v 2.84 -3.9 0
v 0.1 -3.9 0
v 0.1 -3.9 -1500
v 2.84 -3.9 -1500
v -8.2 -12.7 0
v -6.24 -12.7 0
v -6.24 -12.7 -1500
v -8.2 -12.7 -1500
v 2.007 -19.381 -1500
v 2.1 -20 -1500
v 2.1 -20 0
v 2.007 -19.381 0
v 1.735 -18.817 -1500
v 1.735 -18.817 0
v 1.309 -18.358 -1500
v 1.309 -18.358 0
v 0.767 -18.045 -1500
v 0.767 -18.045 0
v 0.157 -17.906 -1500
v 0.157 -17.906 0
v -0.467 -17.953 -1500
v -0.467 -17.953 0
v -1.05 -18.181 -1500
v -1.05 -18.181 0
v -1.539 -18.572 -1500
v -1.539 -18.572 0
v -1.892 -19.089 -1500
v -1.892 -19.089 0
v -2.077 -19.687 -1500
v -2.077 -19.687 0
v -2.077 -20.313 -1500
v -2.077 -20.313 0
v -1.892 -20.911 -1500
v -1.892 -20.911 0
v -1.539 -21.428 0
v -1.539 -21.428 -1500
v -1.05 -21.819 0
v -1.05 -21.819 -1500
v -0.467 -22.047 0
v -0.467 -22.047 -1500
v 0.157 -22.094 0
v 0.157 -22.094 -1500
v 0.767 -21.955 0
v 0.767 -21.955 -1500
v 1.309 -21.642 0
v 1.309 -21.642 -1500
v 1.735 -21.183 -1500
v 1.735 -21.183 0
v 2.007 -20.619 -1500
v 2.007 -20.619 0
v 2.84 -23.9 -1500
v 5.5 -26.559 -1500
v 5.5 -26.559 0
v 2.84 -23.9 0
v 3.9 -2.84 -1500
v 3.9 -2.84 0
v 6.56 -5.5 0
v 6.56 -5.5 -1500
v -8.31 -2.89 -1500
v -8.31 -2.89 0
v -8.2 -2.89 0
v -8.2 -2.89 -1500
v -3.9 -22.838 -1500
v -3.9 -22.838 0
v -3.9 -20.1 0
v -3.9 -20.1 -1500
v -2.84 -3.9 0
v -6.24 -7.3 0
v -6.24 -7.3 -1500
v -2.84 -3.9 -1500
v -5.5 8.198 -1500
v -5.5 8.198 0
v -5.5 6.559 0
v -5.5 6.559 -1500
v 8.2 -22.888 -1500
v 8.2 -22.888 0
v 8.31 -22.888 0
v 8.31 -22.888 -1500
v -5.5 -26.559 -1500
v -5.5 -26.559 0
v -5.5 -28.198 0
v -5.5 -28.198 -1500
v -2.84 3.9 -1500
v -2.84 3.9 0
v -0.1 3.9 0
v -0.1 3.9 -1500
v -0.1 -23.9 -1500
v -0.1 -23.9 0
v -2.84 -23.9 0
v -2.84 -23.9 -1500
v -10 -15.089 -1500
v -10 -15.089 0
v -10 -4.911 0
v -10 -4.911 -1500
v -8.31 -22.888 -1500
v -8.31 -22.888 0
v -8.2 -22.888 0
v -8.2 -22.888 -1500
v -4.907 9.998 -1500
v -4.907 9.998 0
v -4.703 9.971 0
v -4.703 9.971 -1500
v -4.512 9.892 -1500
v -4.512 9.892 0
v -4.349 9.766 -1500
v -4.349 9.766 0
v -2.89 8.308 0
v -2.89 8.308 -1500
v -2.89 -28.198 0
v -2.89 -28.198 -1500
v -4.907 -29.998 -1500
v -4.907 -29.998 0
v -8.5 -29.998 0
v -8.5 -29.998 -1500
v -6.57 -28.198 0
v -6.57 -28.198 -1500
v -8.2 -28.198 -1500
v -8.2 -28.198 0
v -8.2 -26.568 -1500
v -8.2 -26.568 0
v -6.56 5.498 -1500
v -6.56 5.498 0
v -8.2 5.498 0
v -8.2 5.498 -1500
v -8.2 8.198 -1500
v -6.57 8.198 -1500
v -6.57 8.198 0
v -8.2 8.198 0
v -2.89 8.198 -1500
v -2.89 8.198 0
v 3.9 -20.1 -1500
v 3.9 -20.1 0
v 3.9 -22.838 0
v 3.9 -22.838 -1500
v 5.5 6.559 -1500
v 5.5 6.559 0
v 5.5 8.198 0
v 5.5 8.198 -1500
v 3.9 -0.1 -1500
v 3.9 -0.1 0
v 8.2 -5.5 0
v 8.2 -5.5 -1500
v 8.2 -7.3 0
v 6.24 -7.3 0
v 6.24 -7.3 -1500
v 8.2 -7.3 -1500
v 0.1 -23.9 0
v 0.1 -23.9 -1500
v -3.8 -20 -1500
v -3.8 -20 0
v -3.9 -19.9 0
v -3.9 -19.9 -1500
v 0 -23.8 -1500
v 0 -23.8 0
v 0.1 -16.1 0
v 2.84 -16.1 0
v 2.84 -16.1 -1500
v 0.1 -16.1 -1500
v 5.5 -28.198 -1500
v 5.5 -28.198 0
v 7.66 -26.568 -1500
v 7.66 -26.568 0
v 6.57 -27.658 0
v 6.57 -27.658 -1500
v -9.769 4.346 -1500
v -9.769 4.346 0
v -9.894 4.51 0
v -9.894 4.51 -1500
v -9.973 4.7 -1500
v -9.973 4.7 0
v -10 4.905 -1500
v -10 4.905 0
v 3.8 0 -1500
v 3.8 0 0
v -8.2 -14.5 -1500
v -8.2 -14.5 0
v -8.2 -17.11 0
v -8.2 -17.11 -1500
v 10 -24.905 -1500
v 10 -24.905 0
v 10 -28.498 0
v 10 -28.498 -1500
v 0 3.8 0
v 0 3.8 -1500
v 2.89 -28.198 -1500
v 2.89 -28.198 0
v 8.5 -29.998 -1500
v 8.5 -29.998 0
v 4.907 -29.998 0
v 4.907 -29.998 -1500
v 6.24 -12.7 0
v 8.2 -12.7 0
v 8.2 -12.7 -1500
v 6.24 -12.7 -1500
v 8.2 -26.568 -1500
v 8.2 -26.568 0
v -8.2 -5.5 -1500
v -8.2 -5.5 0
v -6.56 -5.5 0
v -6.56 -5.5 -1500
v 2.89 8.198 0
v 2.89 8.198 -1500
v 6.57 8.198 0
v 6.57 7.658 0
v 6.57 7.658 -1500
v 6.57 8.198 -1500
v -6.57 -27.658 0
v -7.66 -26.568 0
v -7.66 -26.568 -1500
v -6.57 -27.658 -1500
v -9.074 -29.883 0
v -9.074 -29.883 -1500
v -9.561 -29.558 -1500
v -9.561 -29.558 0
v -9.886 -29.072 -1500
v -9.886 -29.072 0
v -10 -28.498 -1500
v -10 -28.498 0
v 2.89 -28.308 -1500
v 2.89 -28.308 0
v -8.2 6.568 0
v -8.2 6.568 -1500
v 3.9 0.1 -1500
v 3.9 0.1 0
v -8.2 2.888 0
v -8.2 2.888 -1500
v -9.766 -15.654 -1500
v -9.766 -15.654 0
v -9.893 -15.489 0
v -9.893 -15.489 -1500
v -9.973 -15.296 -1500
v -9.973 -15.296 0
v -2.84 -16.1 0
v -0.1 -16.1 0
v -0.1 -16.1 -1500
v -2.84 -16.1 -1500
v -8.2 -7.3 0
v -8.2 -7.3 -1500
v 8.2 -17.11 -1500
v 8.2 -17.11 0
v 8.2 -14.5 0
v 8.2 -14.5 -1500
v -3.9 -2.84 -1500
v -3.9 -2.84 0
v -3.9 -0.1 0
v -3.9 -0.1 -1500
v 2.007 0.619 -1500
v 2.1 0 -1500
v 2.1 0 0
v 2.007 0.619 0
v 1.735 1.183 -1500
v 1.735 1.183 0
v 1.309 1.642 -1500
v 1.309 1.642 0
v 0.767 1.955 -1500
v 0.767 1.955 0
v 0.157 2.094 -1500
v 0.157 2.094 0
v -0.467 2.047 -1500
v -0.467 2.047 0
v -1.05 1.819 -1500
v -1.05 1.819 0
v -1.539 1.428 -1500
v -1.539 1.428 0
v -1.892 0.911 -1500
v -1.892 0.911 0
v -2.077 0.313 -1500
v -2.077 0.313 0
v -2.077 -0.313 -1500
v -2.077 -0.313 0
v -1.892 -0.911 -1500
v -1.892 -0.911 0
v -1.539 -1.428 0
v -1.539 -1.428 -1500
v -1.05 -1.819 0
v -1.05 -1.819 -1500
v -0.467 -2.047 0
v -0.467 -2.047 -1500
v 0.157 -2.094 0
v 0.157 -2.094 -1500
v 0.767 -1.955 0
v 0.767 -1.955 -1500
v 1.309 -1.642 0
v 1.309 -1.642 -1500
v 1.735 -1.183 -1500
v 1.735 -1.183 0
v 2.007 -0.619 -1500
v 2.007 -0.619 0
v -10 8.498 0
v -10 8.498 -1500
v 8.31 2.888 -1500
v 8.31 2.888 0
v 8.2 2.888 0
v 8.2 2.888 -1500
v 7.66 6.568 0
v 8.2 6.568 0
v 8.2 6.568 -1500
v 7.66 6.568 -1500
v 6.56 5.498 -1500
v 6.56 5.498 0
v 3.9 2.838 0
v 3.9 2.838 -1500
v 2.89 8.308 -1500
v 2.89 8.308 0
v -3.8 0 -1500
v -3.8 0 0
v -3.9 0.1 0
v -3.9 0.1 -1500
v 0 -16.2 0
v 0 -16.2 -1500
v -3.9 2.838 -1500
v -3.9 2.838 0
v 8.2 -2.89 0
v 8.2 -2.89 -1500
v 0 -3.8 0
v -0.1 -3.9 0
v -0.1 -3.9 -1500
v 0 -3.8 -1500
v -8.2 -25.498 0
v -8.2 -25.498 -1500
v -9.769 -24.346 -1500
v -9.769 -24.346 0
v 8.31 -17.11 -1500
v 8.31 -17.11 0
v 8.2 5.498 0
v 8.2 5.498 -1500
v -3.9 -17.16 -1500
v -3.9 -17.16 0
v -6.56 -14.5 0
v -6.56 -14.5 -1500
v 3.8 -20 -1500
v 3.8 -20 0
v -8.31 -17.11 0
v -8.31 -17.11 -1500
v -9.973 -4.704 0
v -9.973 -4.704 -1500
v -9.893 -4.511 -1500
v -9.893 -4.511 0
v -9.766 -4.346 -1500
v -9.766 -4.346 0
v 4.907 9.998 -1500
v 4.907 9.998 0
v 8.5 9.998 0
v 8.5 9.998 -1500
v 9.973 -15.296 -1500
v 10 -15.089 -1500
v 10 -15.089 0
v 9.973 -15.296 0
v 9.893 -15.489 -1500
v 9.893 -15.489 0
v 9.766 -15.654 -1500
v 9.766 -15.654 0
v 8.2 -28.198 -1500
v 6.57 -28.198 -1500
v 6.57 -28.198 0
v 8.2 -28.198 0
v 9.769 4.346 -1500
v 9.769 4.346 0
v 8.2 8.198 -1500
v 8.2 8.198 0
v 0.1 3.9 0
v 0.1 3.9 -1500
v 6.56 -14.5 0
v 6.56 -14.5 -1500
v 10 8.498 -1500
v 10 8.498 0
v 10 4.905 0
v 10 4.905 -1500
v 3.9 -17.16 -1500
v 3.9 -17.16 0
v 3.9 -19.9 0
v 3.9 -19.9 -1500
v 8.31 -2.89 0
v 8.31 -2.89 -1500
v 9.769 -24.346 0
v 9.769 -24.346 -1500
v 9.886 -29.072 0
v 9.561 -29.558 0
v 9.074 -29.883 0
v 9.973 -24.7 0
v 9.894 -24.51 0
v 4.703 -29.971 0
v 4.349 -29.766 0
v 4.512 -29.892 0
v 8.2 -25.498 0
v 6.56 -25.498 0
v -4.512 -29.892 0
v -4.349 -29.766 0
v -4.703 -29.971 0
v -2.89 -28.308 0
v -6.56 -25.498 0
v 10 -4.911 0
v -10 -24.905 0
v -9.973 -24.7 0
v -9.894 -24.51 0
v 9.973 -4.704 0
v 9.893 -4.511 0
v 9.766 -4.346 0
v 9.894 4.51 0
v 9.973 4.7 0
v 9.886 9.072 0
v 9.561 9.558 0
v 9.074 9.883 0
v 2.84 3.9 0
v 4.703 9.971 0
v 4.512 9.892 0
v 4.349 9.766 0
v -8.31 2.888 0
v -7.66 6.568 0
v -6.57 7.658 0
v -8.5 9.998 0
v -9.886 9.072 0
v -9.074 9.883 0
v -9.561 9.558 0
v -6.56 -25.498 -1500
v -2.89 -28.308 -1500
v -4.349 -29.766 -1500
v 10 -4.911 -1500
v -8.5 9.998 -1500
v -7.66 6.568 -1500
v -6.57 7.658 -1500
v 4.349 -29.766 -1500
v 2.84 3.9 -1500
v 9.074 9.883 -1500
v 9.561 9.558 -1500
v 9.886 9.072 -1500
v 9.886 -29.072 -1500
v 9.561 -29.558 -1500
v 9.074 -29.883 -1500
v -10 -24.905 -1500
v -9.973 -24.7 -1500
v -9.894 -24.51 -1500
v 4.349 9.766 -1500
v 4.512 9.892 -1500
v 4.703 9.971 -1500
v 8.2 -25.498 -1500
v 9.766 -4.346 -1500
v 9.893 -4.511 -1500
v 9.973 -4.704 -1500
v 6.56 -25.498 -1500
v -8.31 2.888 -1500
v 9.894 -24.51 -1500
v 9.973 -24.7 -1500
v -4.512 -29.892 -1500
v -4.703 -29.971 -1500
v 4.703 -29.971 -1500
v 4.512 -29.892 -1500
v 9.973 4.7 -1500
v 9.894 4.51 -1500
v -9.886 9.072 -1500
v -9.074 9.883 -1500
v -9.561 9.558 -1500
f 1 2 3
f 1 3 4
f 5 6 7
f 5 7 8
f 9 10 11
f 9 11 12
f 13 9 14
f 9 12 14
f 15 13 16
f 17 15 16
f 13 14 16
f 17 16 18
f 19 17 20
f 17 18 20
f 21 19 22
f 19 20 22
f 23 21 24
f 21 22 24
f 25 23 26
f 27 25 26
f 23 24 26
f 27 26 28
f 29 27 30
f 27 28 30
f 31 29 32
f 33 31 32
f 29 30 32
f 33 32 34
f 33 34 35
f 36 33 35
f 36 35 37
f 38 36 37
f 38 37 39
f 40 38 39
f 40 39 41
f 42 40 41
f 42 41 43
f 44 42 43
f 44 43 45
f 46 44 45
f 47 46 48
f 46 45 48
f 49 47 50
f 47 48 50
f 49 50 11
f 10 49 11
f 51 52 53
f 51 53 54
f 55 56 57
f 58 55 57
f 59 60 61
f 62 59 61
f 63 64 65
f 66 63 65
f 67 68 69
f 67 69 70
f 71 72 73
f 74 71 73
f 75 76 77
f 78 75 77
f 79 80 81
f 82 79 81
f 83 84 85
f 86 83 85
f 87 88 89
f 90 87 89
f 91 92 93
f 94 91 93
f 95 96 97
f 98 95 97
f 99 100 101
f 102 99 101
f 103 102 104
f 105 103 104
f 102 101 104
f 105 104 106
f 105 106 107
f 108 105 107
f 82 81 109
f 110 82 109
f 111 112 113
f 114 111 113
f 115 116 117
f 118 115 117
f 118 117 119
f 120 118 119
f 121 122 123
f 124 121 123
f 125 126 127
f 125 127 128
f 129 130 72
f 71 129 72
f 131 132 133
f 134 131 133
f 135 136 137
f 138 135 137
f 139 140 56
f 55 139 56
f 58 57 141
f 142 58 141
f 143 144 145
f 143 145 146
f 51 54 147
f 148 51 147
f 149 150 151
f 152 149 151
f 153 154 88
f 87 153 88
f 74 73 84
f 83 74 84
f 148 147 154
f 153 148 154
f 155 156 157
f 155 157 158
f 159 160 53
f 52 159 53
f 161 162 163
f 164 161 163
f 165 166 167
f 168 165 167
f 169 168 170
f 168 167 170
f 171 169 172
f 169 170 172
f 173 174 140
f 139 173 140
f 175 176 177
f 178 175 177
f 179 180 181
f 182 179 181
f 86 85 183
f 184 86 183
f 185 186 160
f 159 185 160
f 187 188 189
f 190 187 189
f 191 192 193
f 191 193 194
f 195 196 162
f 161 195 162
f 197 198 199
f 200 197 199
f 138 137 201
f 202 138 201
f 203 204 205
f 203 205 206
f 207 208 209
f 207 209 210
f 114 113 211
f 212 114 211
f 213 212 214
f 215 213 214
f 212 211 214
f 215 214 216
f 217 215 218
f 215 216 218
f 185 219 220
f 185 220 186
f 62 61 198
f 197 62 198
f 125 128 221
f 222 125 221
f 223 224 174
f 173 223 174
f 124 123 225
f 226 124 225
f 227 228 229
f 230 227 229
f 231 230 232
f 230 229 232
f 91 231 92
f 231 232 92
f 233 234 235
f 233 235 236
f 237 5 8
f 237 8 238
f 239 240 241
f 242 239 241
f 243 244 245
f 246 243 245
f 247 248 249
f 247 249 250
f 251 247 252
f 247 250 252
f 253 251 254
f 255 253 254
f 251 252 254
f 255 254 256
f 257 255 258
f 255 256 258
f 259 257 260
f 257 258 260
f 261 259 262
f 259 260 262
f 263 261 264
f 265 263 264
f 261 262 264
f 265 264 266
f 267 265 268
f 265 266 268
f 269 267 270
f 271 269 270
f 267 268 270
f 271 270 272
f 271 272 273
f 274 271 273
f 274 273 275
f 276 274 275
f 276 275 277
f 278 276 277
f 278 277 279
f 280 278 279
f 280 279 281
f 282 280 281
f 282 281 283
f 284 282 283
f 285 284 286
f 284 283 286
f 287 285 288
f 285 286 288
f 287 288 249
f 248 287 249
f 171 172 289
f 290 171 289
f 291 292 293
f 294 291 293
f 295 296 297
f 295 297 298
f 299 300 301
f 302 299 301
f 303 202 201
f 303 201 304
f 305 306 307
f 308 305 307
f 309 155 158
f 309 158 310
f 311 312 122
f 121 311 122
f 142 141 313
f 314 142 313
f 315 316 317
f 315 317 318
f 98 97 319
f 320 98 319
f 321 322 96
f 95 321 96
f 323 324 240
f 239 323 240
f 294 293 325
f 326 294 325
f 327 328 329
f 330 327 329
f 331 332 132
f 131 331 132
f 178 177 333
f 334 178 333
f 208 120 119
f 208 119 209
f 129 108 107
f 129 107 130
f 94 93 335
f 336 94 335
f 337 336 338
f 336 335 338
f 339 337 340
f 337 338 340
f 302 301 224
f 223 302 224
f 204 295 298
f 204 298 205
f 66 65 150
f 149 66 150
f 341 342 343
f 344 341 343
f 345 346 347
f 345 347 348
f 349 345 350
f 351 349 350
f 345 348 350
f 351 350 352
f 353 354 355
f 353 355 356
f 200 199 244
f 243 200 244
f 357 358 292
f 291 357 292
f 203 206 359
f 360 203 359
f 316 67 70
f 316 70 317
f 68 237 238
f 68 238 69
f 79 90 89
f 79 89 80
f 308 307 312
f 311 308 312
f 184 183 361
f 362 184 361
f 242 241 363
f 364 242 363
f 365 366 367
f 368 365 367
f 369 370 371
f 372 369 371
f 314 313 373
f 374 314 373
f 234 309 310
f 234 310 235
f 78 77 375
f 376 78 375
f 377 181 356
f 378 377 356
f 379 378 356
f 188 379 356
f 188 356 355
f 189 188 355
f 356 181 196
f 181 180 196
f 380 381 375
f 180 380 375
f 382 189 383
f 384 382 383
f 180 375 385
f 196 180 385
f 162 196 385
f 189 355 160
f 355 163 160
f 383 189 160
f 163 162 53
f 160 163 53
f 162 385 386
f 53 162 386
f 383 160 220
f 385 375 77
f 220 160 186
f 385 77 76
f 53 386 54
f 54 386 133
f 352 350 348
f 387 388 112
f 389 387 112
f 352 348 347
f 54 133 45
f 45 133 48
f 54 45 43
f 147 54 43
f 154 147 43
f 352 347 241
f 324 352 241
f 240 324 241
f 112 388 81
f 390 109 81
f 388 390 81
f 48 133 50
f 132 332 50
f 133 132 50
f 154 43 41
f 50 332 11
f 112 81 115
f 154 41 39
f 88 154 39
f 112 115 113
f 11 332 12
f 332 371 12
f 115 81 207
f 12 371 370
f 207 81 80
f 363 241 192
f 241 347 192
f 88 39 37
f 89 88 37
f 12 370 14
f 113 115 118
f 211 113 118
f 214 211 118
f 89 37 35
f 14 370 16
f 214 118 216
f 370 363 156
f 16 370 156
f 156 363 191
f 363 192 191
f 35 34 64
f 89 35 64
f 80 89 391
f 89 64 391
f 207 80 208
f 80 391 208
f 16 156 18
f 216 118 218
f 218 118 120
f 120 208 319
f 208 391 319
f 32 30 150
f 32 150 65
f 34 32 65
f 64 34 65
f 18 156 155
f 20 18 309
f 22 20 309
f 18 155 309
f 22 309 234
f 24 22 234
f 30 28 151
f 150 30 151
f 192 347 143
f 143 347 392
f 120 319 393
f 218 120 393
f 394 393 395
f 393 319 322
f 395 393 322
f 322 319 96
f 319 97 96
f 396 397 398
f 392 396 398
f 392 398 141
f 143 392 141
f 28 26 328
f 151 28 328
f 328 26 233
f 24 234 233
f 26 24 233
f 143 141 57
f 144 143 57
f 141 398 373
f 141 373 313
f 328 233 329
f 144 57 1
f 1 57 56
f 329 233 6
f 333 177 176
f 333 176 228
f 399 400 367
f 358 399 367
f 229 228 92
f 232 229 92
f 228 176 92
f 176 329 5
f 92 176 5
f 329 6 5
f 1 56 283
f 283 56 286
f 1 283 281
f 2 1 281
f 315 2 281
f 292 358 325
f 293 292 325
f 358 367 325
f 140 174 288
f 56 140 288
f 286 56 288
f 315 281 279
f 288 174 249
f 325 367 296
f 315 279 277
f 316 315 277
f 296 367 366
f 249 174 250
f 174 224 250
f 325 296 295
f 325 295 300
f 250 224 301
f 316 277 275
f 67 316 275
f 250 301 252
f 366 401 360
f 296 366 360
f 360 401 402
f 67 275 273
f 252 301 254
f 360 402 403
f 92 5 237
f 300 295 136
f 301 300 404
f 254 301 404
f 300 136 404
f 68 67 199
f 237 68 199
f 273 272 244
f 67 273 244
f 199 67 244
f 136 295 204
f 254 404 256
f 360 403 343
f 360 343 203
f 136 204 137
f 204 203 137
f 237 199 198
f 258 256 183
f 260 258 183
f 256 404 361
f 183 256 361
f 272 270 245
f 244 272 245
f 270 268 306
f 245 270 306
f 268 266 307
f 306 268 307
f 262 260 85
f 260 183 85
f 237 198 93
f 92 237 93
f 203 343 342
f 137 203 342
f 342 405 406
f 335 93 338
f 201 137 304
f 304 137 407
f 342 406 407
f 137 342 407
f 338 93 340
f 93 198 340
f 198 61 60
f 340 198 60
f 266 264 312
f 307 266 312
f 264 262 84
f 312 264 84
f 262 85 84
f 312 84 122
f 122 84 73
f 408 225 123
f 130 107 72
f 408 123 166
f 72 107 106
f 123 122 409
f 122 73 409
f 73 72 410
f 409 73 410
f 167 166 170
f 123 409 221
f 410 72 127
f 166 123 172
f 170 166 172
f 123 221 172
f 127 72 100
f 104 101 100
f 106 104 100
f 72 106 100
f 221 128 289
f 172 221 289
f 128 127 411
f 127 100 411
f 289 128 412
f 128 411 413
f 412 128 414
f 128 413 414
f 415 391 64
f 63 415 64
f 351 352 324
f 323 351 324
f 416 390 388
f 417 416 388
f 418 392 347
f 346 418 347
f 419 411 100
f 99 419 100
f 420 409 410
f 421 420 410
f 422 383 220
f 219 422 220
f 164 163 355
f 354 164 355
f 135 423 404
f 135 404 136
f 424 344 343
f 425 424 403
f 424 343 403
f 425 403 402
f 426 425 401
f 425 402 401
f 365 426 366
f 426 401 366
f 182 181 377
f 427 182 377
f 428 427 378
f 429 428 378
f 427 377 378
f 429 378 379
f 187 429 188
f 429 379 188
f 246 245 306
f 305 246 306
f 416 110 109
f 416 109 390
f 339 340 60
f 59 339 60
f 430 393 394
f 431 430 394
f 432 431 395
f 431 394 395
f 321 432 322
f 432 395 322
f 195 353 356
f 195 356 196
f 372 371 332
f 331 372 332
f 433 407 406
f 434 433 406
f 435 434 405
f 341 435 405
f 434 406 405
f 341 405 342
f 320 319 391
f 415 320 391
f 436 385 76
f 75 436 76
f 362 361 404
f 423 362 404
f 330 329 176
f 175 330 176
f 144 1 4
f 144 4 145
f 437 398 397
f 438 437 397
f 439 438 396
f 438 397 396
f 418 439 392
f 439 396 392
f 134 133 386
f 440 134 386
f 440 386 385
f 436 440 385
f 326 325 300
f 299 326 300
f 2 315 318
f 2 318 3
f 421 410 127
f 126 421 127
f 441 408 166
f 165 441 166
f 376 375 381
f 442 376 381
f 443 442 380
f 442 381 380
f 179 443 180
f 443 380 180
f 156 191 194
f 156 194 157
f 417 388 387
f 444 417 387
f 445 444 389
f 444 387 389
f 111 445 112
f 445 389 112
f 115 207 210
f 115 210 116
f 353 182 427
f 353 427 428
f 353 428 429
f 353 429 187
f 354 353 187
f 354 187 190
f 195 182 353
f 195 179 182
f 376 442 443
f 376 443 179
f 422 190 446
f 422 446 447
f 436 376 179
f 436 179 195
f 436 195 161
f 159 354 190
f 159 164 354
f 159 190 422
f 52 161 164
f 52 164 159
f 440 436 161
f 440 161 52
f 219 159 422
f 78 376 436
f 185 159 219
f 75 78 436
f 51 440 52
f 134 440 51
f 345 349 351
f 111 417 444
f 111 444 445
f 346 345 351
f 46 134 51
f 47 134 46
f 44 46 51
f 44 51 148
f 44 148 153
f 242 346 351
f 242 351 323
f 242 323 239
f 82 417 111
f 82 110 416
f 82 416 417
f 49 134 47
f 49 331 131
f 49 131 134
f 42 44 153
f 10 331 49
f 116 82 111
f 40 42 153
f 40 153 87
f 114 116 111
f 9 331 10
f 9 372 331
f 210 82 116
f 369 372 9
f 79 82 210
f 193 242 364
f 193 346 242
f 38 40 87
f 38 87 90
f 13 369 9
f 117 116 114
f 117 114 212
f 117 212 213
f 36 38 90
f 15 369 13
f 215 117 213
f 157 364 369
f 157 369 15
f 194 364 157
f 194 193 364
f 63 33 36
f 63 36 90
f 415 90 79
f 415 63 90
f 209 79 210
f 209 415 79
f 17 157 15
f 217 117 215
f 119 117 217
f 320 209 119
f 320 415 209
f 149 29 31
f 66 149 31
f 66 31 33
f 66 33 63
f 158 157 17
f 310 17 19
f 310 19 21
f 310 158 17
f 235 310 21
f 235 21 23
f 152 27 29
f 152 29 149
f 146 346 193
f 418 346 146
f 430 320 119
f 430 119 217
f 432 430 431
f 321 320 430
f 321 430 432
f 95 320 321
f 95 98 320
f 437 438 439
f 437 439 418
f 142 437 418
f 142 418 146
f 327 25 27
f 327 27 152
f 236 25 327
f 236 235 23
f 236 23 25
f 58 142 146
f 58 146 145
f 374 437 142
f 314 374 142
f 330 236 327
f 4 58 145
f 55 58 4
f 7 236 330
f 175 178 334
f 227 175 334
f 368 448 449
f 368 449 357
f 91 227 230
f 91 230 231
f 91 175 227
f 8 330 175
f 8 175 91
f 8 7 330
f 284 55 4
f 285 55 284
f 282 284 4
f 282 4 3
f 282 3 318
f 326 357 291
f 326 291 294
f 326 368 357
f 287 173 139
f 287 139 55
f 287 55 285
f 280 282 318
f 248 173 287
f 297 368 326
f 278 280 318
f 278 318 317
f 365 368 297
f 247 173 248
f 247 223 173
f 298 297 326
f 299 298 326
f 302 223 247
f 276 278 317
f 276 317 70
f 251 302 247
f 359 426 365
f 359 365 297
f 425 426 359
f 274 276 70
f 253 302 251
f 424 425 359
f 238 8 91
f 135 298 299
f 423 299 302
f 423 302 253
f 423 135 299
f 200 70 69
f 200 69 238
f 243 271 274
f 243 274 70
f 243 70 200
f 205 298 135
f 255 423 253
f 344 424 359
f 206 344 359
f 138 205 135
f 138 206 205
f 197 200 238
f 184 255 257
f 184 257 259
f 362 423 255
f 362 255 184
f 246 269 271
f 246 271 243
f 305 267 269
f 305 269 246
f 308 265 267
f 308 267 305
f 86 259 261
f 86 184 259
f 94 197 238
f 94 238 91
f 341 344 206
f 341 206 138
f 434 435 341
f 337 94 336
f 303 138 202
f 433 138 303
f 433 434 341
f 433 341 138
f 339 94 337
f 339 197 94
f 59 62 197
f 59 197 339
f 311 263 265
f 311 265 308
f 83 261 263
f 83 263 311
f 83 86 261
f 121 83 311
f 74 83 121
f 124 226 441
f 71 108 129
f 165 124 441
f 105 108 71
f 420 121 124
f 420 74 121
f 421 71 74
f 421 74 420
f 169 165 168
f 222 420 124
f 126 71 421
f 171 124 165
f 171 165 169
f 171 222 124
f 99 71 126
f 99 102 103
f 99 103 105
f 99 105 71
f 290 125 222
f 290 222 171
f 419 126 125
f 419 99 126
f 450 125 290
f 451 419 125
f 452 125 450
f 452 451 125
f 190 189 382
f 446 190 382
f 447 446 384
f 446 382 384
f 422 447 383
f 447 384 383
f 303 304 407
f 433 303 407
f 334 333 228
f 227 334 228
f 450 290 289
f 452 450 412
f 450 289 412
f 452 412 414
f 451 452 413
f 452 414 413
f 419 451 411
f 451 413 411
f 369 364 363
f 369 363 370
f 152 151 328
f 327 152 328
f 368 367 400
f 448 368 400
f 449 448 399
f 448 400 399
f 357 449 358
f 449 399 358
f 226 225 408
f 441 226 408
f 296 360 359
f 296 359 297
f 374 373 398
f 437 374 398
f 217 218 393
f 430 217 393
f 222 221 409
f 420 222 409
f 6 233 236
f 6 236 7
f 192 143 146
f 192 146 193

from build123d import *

# Parameters (mm, degrees)
SKETCH2_R           = 2.1
BOSS_EXTRUDE1_DEPTH = 1500


with BuildPart() as part:
    # Sketch2 → Boss-Extrude1 (new body)
    with BuildSketch(Plane.XY):
        with BuildLine():
            Line((-0.1, 3.9), (0, 3.8))
            Line((0, 3.8), (0.1, 3.9))
            Line((0.1, 3.9), (2.840365134, 3.9))
            Line((2.840365134, 3.9), (5.5, 6.558825842))
            Line((5.5, 6.558825842), (5.5, 8.197505675))
            Line((5.5, 8.197505675), (2.89, 8.197505675))
            Line((2.89, 8.197505675), (2.89, 8.307505675))
            Line((2.89, 8.307505675), (4.348614357, 9.766120032))
            ThreePointArc((4.348614357, 9.766120032), (4.604908803, 9.937370505), (4.907228714, 9.997505675))
            Line((4.907228714, 9.997505675), (8.5, 9.997505675))
            ThreePointArc((8.5, 9.997505675), (9.560660172, 9.558165846), (10, 8.497505675))
            Line((10, 8.497505675), (10, 4.904734389))
            ThreePointArc((10, 4.904734389), (9.939864831, 4.602414477), (9.768614357, 4.346120032))
            Line((9.768614357, 4.346120032), (8.31, 2.887505675))
            Line((8.31, 2.887505675), (8.2, 2.887505675))
            Line((8.2, 2.887505675), (8.2, 5.497505675))
            Line((8.2, 5.497505675), (6.56, 5.497505675))
            Line((6.56, 5.497505675), (3.9, 2.83831481))
            Line((3.9, 2.83831481), (3.9, 0.1))
            Line((3.9, 0.1), (3.8, 0))
            Line((3.8, 0), (3.9, -0.1))
            Line((3.9, -0.1), (3.9, -2.84))
            Line((3.9, -2.84), (6.56, -5.5))
            Line((6.56, -5.5), (8.2, -5.5))
            Line((8.2, -5.5), (8.2, -2.89))
            Line((8.2, -2.89), (8.31, -2.89))
            Line((8.31, -2.89), (9.765685425, -4.345685425))
            ThreePointArc((9.765685425, -4.345685425), (9.939103626, -4.605224104), (10, -4.91137085))
            Line((10, -4.91137085), (10, -15.08862915))
            ThreePointArc((10, -15.08862915), (9.939103626, -15.394775896), (9.765685425, -15.654314575))
            Line((9.765685425, -15.654314575), (8.31, -17.11))
            Line((8.31, -17.11), (8.2, -17.11))
            Line((8.2, -17.11), (8.2, -14.5))
            Line((8.2, -14.5), (6.56, -14.5))
            Line((6.56, -14.5), (3.9, -17.16))
            Line((3.9, -17.16), (3.9, -19.9))
            Line((3.9, -19.9), (3.8, -20))
            Line((3.8, -20), (3.9, -20.1))
            Line((3.9, -20.1), (3.9, -22.83831481))
            Line((3.9, -22.83831481), (6.56, -25.497505675))
            Line((6.56, -25.497505675), (8.2, -25.497505675))
            Line((8.2, -25.497505675), (8.2, -22.887505675))
            Line((8.2, -22.887505675), (8.31, -22.887505675))
            Line((8.31, -22.887505675), (9.768614357, -24.346120032))
            ThreePointArc((9.768614357, -24.346120032), (9.939864831, -24.602414477), (10, -24.904734389))
            Line((10, -24.904734389), (10, -28.497505675))
            ThreePointArc((10, -28.497505675), (9.560660172, -29.558165846), (8.5, -29.997505675))
            Line((8.5, -29.997505675), (4.907228714, -29.997505675))
            ThreePointArc((4.907228714, -29.997505675), (4.604908803, -29.937370505), (4.348614357, -29.766120032))
            Line((4.348614357, -29.766120032), (2.89, -28.307505675))
            Line((2.89, -28.307505675), (2.89, -28.197505675))
            Line((2.89, -28.197505675), (5.5, -28.197505675))
            Line((5.5, -28.197505675), (5.5, -26.558825842))
            Line((5.5, -26.558825842), (2.840365134, -23.9))
            Line((2.840365134, -23.9), (0.1, -23.9))
            Line((0.1, -23.9), (0, -23.8))
            Line((0, -23.8), (-0.1, -23.9))
            Line((-0.1, -23.9), (-2.840365134, -23.9))
            Line((-2.840365134, -23.9), (-5.5, -26.558825842))
            Line((-5.5, -26.558825842), (-5.5, -28.197505675))
            Line((-5.5, -28.197505675), (-2.89, -28.197505675))
            Line((-2.89, -28.197505675), (-2.89, -28.307505675))
            Line((-2.89, -28.307505675), (-4.348614357, -29.766120032))
            ThreePointArc((-4.348614357, -29.766120032), (-4.604908803, -29.937370505), (-4.907228714, -29.997505675))
            Line((-4.907228714, -29.997505675), (-8.5, -29.997505675))
            ThreePointArc((-8.5, -29.997505675), (-9.560660172, -29.558165846), (-10, -28.497505675))
            Line((-10, -28.497505675), (-10, -24.904734389))
            ThreePointArc((-10, -24.904734389), (-9.939864831, -24.602414477), (-9.768614357, -24.346120032))
            Line((-9.768614357, -24.346120032), (-8.31, -22.887505675))
            Line((-8.31, -22.887505675), (-8.2, -22.887505675))
            Line((-8.2, -22.887505675), (-8.2, -25.497505675))
            Line((-8.2, -25.497505675), (-6.56, -25.497505675))
            Line((-6.56, -25.497505675), (-3.9, -22.83831481))
            Line((-3.9, -22.83831481), (-3.9, -20.1))
            Line((-3.9, -20.1), (-3.8, -20))
            Line((-3.8, -20), (-3.9, -19.9))
            Line((-3.9, -19.9), (-3.9, -17.16))
            Line((-3.9, -17.16), (-6.56, -14.5))
            Line((-6.56, -14.5), (-8.2, -14.5))
            Line((-8.2, -14.5), (-8.2, -17.11))
            Line((-8.2, -17.11), (-8.31, -17.11))
            Line((-8.31, -17.11), (-9.765685425, -15.654314575))
            ThreePointArc((-9.765685425, -15.654314575), (-9.939103626, -15.394775896), (-10, -15.08862915))
            Line((-10, -15.08862915), (-10, -4.91137085))
            ThreePointArc((-10, -4.91137085), (-9.939103626, -4.605224104), (-9.765685425, -4.345685425))
            Line((-9.765685425, -4.345685425), (-8.31, -2.89))
            Line((-8.31, -2.89), (-8.2, -2.89))
            Line((-8.2, -2.89), (-8.2, -5.5))
            Line((-8.2, -5.5), (-6.56, -5.5))
            Line((-6.56, -5.5), (-3.9, -2.84))
            Line((-3.9, -2.84), (-3.9, -0.1))
            Line((-3.9, -0.1), (-3.8, 0))
            Line((-3.8, 0), (-3.9, 0.1))
            Line((-3.9, 0.1), (-3.9, 2.83831481))
            Line((-3.9, 2.83831481), (-6.56, 5.497505675))
            Line((-6.56, 5.497505675), (-8.2, 5.497505675))
            Line((-8.2, 5.497505675), (-8.2, 2.887505675))
            Line((-8.2, 2.887505675), (-8.31, 2.887505675))
            Line((-8.31, 2.887505675), (-9.768614357, 4.346120032))
            ThreePointArc((-9.768614357, 4.346120032), (-9.939864831, 4.602414477), (-10, 4.904734389))
            Line((-10, 4.904734389), (-10, 8.497505675))
            ThreePointArc((-10, 8.497505675), (-9.560660172, 9.558165846), (-8.5, 9.997505675))
            Line((-8.5, 9.997505675), (-4.907228714, 9.997505675))
            ThreePointArc((-4.907228714, 9.997505675), (-4.604908803, 9.937370505), (-4.348614357, 9.766120032))
            Line((-4.348614357, 9.766120032), (-2.89, 8.307505675))
            Line((-2.89, 8.307505675), (-2.89, 8.197505675))
            Line((-2.89, 8.197505675), (-5.5, 8.197505675))
            Line((-5.5, 8.197505675), (-5.5, 6.558825842))
            Line((-5.5, 6.558825842), (-2.840365134, 3.9))
            Line((-2.840365134, 3.9), (-0.1, 3.9))
        make_face()
        Circle(SKETCH2_R, mode=Mode.SUBTRACT)
        with Locations((0, -20)):
            Circle(SKETCH2_R, mode=Mode.SUBTRACT)
        Polygon((-7.66, 6.567505675), (-6.57, 7.657505675), (-6.57, 8.197505675), (-8.2, 8.197505675), (-8.2, 6.567505675), align=None, mode=Mode.SUBTRACT)
        Polygon((-0.1, -3.9), (0, -3.8), (0.1, -3.9), (2.840365134, -3.9), (6.24, -7.299634866), (8.2, -7.299634866), (8.2, -12.700365134), (6.24, -12.700365134), (2.840365134, -16.1), (0.1, -16.1), (0, -16.2), (-0.1, -16.1), (-2.840365134, -16.1), (-6.24, -12.700365134), (-8.2, -12.700365134), (-8.2, -7.299634866), (-6.24, -7.299634866), (-2.840365134, -3.9), align=None, mode=Mode.SUBTRACT)
        Polygon((8.2, 6.567505675), (7.66, 6.567505675), (6.57, 7.657505675), (6.57, 8.197505675), (8.2, 8.197505675), align=None, mode=Mode.SUBTRACT)
        Polygon((7.66, -26.567505675), (6.57, -27.657505675), (6.57, -28.197505675), (8.2, -28.197505675), (8.2, -26.567505675), align=None, mode=Mode.SUBTRACT)
        Polygon((-8.2, -26.567505675), (-7.66, -26.567505675), (-6.57, -27.657505675), (-6.57, -28.197505675), (-8.2, -28.197505675), align=None, mode=Mode.SUBTRACT)
    extrude(amount=-BOSS_EXTRUDE1_DEPTH)


solid = part.part
